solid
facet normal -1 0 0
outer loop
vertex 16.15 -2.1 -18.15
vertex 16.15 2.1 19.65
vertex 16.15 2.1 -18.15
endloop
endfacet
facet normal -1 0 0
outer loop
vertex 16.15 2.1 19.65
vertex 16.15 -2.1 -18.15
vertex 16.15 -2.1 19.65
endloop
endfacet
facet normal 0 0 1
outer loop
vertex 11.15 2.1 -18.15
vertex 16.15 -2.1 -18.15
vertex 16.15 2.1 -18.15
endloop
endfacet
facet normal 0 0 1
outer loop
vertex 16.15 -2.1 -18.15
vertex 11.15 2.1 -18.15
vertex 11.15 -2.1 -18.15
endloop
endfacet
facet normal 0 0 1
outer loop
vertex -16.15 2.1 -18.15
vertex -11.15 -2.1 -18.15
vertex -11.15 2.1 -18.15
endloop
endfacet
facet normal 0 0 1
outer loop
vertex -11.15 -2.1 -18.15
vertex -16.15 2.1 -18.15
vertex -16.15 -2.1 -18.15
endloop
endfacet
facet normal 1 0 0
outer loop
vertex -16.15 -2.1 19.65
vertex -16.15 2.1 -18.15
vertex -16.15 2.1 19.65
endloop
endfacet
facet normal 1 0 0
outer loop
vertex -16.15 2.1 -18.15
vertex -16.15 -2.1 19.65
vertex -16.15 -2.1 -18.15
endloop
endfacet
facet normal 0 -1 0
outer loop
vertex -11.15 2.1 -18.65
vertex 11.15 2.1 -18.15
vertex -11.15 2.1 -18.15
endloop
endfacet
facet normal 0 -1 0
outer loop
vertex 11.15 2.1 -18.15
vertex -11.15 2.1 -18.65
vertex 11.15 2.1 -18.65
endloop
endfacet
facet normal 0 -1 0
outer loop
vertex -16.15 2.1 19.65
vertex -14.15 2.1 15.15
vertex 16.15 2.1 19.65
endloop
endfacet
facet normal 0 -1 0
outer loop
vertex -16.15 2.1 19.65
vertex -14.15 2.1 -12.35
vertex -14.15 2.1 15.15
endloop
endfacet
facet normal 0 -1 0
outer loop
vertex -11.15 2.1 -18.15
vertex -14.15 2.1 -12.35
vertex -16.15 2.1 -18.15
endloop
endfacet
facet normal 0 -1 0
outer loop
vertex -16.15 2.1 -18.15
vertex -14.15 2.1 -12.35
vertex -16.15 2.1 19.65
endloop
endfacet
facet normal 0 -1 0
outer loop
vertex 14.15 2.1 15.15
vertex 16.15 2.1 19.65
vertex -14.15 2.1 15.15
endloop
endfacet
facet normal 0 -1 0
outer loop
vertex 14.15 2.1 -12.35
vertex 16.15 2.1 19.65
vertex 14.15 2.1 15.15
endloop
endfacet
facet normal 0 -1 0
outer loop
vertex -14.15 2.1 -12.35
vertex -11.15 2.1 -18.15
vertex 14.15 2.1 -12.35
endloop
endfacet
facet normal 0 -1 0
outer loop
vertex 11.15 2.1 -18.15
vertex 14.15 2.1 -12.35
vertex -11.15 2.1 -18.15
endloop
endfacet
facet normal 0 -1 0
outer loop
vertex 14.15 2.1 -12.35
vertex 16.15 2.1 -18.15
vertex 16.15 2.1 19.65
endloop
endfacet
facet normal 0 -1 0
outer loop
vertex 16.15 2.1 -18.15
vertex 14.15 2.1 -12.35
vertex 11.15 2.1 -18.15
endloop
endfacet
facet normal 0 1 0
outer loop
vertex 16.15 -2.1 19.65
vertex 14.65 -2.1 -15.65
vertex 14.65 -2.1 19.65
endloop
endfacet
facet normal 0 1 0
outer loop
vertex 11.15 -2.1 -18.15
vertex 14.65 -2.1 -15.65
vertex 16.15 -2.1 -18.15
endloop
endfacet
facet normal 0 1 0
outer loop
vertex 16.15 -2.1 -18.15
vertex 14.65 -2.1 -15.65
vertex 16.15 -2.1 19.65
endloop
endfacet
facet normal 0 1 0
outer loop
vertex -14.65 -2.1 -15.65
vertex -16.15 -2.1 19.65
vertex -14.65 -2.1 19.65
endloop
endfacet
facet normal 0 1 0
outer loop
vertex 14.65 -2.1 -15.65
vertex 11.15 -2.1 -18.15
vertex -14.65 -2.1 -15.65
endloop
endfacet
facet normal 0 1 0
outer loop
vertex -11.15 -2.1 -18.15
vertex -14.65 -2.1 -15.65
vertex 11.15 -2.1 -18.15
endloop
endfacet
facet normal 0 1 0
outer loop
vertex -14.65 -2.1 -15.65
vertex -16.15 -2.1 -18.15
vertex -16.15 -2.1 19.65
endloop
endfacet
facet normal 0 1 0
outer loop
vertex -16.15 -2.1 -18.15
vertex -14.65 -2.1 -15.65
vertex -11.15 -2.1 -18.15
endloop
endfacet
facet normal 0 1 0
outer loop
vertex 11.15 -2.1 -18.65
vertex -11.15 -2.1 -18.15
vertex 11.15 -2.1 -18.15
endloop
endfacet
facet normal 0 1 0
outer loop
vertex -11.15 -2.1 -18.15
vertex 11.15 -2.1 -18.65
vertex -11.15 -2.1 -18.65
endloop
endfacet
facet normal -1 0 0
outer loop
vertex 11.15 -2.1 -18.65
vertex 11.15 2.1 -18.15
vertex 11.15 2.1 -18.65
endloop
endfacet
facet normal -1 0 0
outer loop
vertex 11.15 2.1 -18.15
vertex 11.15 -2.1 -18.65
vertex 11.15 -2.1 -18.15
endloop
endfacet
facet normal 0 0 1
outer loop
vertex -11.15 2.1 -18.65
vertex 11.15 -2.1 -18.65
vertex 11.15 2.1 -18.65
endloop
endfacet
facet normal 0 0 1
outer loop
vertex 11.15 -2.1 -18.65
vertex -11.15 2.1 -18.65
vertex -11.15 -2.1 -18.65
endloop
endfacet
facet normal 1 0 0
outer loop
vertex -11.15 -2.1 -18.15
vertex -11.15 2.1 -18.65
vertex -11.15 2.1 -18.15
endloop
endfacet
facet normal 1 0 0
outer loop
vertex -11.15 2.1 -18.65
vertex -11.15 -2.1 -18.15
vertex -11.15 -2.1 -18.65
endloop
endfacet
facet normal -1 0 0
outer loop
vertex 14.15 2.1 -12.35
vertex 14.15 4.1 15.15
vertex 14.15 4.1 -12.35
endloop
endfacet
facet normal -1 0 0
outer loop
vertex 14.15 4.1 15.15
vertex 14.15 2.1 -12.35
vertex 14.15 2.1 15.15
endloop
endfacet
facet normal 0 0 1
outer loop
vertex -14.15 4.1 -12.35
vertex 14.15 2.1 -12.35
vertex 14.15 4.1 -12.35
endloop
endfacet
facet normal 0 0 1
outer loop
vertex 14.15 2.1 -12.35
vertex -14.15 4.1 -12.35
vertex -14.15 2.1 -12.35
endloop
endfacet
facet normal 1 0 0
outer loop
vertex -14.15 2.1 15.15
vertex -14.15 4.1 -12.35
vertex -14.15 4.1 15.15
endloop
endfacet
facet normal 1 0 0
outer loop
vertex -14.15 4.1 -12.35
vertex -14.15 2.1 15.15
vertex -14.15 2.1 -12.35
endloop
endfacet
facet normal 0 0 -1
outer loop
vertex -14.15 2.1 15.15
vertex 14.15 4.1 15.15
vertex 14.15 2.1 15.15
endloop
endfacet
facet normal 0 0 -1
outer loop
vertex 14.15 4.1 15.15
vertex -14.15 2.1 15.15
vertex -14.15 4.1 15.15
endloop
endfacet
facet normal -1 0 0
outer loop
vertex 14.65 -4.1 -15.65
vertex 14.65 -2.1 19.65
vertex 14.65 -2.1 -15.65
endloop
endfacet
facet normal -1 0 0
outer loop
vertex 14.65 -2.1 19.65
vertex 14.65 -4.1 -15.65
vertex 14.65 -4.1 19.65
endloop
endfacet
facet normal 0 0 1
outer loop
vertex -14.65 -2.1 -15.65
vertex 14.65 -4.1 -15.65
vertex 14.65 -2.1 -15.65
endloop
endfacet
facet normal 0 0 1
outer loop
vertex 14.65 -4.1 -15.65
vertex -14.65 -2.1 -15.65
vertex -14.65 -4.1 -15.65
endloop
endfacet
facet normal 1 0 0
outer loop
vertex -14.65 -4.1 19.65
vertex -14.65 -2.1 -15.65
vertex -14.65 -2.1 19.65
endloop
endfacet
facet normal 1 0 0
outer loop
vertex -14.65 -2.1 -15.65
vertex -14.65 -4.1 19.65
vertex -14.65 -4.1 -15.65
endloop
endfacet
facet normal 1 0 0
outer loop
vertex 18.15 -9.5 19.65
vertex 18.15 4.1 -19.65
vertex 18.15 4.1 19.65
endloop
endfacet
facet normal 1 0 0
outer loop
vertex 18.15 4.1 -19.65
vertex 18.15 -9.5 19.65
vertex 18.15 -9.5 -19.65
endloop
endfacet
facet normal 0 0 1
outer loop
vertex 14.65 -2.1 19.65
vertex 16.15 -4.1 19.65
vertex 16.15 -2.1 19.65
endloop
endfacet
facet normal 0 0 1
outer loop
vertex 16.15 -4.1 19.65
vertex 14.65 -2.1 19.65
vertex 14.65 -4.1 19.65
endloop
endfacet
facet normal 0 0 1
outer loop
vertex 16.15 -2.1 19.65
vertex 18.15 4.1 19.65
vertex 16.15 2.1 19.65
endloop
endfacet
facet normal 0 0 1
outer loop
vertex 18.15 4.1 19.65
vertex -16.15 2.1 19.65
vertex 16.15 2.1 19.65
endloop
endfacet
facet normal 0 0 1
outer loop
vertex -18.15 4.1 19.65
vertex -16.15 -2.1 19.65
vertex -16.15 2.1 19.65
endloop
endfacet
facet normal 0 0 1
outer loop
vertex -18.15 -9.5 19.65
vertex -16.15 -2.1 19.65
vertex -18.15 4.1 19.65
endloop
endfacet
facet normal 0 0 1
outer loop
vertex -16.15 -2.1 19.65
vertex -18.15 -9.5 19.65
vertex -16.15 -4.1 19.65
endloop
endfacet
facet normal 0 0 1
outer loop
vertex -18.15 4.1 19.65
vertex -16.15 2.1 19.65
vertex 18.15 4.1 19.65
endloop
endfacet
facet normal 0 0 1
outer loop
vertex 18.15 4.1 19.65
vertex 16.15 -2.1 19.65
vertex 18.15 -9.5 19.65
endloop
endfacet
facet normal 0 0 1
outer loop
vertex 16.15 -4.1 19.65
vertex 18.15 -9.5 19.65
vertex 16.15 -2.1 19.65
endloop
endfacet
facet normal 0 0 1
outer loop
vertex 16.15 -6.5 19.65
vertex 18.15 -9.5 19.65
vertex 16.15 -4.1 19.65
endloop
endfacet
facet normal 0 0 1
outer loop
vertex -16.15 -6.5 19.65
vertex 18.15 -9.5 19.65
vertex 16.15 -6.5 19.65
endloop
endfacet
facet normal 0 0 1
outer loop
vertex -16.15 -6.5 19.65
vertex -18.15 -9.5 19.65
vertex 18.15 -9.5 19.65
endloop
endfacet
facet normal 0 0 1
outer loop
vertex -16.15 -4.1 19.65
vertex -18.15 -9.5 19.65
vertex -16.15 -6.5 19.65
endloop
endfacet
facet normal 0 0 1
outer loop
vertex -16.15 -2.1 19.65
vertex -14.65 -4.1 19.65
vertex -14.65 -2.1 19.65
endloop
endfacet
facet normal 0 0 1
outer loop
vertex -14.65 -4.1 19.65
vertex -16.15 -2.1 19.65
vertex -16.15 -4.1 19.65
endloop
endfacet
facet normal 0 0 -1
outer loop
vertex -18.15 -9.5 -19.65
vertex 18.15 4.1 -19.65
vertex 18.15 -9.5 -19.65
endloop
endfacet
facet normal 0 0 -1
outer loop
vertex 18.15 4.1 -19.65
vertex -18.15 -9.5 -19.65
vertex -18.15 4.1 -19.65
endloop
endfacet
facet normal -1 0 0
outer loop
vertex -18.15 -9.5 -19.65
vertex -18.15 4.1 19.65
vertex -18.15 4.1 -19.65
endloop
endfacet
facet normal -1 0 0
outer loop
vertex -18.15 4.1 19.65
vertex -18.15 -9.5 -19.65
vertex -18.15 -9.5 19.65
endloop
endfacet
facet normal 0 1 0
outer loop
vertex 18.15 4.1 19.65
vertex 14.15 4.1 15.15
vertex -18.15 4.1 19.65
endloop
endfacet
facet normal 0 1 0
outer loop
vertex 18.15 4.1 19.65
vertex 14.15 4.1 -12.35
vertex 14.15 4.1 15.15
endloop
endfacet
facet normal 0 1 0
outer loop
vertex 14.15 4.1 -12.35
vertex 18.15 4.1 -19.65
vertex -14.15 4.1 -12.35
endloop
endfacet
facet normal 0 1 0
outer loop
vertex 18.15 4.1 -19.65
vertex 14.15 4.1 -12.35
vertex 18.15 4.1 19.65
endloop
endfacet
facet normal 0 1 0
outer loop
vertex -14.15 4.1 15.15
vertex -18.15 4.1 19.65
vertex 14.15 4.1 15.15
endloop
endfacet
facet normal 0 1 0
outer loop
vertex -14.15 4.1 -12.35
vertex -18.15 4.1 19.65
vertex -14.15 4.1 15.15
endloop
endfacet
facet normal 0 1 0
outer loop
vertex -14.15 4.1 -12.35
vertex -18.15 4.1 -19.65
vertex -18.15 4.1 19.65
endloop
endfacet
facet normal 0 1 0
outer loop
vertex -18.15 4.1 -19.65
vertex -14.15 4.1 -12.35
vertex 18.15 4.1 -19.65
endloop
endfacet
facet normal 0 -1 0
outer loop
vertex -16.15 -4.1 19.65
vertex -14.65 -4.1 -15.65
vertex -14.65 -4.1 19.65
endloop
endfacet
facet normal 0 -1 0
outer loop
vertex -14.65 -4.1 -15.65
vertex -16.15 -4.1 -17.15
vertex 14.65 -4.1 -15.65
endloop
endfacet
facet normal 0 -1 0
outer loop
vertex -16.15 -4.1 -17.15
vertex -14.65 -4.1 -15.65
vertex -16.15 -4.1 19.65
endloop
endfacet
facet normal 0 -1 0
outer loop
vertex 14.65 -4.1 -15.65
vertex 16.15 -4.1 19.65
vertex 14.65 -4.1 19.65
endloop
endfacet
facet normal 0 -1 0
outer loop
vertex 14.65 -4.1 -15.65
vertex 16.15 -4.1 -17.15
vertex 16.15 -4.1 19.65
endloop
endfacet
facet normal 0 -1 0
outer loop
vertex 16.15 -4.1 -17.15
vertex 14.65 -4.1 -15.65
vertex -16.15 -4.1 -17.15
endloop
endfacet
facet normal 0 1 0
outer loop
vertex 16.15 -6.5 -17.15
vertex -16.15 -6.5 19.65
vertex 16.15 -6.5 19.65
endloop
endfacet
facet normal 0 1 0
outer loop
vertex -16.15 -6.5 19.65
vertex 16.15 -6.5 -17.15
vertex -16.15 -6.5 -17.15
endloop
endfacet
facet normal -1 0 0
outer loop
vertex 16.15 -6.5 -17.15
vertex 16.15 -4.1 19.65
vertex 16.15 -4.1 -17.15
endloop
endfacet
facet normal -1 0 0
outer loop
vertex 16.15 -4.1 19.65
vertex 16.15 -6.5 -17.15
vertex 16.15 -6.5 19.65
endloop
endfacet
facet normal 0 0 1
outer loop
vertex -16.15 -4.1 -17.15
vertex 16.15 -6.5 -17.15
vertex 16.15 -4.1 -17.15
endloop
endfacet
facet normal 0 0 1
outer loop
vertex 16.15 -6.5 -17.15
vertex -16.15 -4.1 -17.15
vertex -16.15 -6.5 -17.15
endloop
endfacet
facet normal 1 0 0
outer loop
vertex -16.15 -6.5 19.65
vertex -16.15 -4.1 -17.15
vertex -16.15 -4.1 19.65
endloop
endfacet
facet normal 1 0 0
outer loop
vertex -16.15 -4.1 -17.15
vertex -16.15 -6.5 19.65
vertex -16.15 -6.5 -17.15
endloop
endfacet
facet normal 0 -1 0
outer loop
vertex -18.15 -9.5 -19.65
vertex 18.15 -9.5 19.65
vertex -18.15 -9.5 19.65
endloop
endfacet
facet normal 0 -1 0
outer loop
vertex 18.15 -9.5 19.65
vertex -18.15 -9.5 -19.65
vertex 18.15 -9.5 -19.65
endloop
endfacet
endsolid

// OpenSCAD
//长宽高
ma=32.3;//横着
mb=34.3;//竖着
mc=4.2;//厚度

l1=1.6;//屏幕顶部
l2=2;//两边
l3=4.8;//屏幕底部

ll=3;//默认槽宽


difference()
{
    cube([ma+4,mc+4,mb+5],true);
    union()
    {
        translate([0,0,-1])//中间的空间向下一点
            cube([ma,mc,mb],true);//中间的空间
        translate([0,0,-1.5])//屏幕排线
            cube([ma-10,mc,mb],true);
        
        translate([0,3,0])//前面扣洞
            cube([ma-l2*2,mc,mb-l3*2],true);
        translate([0,3,mb/4])//前面再扣洞
            cube([ma-l2*2,mc,mb/2-l2*2],true);
        translate([0,-3,0])//背面扣洞
            cube([ma-ll,mc,mb-ll],true);
        
        translate([0,0,5])//上面扣洞
            cube([ma,mc,mb],true);
        translate([0,-3,10])//去掉一个梁
            cube([ma-ll,mc,mb-ll],true);
    }
}
translate([0,-8,0])//背面
    cube([ma+4,3,mb+5],true);

difference()
{
    translate([0,-5,0])//背面
        cube([ma+4,3,mb+5],true);
    translate([0,-5,0])//背面
    union()
    {
        translate([0,0,5])//上面扣洞
            cube([ma,mc,mb+10],true);
    }
}
